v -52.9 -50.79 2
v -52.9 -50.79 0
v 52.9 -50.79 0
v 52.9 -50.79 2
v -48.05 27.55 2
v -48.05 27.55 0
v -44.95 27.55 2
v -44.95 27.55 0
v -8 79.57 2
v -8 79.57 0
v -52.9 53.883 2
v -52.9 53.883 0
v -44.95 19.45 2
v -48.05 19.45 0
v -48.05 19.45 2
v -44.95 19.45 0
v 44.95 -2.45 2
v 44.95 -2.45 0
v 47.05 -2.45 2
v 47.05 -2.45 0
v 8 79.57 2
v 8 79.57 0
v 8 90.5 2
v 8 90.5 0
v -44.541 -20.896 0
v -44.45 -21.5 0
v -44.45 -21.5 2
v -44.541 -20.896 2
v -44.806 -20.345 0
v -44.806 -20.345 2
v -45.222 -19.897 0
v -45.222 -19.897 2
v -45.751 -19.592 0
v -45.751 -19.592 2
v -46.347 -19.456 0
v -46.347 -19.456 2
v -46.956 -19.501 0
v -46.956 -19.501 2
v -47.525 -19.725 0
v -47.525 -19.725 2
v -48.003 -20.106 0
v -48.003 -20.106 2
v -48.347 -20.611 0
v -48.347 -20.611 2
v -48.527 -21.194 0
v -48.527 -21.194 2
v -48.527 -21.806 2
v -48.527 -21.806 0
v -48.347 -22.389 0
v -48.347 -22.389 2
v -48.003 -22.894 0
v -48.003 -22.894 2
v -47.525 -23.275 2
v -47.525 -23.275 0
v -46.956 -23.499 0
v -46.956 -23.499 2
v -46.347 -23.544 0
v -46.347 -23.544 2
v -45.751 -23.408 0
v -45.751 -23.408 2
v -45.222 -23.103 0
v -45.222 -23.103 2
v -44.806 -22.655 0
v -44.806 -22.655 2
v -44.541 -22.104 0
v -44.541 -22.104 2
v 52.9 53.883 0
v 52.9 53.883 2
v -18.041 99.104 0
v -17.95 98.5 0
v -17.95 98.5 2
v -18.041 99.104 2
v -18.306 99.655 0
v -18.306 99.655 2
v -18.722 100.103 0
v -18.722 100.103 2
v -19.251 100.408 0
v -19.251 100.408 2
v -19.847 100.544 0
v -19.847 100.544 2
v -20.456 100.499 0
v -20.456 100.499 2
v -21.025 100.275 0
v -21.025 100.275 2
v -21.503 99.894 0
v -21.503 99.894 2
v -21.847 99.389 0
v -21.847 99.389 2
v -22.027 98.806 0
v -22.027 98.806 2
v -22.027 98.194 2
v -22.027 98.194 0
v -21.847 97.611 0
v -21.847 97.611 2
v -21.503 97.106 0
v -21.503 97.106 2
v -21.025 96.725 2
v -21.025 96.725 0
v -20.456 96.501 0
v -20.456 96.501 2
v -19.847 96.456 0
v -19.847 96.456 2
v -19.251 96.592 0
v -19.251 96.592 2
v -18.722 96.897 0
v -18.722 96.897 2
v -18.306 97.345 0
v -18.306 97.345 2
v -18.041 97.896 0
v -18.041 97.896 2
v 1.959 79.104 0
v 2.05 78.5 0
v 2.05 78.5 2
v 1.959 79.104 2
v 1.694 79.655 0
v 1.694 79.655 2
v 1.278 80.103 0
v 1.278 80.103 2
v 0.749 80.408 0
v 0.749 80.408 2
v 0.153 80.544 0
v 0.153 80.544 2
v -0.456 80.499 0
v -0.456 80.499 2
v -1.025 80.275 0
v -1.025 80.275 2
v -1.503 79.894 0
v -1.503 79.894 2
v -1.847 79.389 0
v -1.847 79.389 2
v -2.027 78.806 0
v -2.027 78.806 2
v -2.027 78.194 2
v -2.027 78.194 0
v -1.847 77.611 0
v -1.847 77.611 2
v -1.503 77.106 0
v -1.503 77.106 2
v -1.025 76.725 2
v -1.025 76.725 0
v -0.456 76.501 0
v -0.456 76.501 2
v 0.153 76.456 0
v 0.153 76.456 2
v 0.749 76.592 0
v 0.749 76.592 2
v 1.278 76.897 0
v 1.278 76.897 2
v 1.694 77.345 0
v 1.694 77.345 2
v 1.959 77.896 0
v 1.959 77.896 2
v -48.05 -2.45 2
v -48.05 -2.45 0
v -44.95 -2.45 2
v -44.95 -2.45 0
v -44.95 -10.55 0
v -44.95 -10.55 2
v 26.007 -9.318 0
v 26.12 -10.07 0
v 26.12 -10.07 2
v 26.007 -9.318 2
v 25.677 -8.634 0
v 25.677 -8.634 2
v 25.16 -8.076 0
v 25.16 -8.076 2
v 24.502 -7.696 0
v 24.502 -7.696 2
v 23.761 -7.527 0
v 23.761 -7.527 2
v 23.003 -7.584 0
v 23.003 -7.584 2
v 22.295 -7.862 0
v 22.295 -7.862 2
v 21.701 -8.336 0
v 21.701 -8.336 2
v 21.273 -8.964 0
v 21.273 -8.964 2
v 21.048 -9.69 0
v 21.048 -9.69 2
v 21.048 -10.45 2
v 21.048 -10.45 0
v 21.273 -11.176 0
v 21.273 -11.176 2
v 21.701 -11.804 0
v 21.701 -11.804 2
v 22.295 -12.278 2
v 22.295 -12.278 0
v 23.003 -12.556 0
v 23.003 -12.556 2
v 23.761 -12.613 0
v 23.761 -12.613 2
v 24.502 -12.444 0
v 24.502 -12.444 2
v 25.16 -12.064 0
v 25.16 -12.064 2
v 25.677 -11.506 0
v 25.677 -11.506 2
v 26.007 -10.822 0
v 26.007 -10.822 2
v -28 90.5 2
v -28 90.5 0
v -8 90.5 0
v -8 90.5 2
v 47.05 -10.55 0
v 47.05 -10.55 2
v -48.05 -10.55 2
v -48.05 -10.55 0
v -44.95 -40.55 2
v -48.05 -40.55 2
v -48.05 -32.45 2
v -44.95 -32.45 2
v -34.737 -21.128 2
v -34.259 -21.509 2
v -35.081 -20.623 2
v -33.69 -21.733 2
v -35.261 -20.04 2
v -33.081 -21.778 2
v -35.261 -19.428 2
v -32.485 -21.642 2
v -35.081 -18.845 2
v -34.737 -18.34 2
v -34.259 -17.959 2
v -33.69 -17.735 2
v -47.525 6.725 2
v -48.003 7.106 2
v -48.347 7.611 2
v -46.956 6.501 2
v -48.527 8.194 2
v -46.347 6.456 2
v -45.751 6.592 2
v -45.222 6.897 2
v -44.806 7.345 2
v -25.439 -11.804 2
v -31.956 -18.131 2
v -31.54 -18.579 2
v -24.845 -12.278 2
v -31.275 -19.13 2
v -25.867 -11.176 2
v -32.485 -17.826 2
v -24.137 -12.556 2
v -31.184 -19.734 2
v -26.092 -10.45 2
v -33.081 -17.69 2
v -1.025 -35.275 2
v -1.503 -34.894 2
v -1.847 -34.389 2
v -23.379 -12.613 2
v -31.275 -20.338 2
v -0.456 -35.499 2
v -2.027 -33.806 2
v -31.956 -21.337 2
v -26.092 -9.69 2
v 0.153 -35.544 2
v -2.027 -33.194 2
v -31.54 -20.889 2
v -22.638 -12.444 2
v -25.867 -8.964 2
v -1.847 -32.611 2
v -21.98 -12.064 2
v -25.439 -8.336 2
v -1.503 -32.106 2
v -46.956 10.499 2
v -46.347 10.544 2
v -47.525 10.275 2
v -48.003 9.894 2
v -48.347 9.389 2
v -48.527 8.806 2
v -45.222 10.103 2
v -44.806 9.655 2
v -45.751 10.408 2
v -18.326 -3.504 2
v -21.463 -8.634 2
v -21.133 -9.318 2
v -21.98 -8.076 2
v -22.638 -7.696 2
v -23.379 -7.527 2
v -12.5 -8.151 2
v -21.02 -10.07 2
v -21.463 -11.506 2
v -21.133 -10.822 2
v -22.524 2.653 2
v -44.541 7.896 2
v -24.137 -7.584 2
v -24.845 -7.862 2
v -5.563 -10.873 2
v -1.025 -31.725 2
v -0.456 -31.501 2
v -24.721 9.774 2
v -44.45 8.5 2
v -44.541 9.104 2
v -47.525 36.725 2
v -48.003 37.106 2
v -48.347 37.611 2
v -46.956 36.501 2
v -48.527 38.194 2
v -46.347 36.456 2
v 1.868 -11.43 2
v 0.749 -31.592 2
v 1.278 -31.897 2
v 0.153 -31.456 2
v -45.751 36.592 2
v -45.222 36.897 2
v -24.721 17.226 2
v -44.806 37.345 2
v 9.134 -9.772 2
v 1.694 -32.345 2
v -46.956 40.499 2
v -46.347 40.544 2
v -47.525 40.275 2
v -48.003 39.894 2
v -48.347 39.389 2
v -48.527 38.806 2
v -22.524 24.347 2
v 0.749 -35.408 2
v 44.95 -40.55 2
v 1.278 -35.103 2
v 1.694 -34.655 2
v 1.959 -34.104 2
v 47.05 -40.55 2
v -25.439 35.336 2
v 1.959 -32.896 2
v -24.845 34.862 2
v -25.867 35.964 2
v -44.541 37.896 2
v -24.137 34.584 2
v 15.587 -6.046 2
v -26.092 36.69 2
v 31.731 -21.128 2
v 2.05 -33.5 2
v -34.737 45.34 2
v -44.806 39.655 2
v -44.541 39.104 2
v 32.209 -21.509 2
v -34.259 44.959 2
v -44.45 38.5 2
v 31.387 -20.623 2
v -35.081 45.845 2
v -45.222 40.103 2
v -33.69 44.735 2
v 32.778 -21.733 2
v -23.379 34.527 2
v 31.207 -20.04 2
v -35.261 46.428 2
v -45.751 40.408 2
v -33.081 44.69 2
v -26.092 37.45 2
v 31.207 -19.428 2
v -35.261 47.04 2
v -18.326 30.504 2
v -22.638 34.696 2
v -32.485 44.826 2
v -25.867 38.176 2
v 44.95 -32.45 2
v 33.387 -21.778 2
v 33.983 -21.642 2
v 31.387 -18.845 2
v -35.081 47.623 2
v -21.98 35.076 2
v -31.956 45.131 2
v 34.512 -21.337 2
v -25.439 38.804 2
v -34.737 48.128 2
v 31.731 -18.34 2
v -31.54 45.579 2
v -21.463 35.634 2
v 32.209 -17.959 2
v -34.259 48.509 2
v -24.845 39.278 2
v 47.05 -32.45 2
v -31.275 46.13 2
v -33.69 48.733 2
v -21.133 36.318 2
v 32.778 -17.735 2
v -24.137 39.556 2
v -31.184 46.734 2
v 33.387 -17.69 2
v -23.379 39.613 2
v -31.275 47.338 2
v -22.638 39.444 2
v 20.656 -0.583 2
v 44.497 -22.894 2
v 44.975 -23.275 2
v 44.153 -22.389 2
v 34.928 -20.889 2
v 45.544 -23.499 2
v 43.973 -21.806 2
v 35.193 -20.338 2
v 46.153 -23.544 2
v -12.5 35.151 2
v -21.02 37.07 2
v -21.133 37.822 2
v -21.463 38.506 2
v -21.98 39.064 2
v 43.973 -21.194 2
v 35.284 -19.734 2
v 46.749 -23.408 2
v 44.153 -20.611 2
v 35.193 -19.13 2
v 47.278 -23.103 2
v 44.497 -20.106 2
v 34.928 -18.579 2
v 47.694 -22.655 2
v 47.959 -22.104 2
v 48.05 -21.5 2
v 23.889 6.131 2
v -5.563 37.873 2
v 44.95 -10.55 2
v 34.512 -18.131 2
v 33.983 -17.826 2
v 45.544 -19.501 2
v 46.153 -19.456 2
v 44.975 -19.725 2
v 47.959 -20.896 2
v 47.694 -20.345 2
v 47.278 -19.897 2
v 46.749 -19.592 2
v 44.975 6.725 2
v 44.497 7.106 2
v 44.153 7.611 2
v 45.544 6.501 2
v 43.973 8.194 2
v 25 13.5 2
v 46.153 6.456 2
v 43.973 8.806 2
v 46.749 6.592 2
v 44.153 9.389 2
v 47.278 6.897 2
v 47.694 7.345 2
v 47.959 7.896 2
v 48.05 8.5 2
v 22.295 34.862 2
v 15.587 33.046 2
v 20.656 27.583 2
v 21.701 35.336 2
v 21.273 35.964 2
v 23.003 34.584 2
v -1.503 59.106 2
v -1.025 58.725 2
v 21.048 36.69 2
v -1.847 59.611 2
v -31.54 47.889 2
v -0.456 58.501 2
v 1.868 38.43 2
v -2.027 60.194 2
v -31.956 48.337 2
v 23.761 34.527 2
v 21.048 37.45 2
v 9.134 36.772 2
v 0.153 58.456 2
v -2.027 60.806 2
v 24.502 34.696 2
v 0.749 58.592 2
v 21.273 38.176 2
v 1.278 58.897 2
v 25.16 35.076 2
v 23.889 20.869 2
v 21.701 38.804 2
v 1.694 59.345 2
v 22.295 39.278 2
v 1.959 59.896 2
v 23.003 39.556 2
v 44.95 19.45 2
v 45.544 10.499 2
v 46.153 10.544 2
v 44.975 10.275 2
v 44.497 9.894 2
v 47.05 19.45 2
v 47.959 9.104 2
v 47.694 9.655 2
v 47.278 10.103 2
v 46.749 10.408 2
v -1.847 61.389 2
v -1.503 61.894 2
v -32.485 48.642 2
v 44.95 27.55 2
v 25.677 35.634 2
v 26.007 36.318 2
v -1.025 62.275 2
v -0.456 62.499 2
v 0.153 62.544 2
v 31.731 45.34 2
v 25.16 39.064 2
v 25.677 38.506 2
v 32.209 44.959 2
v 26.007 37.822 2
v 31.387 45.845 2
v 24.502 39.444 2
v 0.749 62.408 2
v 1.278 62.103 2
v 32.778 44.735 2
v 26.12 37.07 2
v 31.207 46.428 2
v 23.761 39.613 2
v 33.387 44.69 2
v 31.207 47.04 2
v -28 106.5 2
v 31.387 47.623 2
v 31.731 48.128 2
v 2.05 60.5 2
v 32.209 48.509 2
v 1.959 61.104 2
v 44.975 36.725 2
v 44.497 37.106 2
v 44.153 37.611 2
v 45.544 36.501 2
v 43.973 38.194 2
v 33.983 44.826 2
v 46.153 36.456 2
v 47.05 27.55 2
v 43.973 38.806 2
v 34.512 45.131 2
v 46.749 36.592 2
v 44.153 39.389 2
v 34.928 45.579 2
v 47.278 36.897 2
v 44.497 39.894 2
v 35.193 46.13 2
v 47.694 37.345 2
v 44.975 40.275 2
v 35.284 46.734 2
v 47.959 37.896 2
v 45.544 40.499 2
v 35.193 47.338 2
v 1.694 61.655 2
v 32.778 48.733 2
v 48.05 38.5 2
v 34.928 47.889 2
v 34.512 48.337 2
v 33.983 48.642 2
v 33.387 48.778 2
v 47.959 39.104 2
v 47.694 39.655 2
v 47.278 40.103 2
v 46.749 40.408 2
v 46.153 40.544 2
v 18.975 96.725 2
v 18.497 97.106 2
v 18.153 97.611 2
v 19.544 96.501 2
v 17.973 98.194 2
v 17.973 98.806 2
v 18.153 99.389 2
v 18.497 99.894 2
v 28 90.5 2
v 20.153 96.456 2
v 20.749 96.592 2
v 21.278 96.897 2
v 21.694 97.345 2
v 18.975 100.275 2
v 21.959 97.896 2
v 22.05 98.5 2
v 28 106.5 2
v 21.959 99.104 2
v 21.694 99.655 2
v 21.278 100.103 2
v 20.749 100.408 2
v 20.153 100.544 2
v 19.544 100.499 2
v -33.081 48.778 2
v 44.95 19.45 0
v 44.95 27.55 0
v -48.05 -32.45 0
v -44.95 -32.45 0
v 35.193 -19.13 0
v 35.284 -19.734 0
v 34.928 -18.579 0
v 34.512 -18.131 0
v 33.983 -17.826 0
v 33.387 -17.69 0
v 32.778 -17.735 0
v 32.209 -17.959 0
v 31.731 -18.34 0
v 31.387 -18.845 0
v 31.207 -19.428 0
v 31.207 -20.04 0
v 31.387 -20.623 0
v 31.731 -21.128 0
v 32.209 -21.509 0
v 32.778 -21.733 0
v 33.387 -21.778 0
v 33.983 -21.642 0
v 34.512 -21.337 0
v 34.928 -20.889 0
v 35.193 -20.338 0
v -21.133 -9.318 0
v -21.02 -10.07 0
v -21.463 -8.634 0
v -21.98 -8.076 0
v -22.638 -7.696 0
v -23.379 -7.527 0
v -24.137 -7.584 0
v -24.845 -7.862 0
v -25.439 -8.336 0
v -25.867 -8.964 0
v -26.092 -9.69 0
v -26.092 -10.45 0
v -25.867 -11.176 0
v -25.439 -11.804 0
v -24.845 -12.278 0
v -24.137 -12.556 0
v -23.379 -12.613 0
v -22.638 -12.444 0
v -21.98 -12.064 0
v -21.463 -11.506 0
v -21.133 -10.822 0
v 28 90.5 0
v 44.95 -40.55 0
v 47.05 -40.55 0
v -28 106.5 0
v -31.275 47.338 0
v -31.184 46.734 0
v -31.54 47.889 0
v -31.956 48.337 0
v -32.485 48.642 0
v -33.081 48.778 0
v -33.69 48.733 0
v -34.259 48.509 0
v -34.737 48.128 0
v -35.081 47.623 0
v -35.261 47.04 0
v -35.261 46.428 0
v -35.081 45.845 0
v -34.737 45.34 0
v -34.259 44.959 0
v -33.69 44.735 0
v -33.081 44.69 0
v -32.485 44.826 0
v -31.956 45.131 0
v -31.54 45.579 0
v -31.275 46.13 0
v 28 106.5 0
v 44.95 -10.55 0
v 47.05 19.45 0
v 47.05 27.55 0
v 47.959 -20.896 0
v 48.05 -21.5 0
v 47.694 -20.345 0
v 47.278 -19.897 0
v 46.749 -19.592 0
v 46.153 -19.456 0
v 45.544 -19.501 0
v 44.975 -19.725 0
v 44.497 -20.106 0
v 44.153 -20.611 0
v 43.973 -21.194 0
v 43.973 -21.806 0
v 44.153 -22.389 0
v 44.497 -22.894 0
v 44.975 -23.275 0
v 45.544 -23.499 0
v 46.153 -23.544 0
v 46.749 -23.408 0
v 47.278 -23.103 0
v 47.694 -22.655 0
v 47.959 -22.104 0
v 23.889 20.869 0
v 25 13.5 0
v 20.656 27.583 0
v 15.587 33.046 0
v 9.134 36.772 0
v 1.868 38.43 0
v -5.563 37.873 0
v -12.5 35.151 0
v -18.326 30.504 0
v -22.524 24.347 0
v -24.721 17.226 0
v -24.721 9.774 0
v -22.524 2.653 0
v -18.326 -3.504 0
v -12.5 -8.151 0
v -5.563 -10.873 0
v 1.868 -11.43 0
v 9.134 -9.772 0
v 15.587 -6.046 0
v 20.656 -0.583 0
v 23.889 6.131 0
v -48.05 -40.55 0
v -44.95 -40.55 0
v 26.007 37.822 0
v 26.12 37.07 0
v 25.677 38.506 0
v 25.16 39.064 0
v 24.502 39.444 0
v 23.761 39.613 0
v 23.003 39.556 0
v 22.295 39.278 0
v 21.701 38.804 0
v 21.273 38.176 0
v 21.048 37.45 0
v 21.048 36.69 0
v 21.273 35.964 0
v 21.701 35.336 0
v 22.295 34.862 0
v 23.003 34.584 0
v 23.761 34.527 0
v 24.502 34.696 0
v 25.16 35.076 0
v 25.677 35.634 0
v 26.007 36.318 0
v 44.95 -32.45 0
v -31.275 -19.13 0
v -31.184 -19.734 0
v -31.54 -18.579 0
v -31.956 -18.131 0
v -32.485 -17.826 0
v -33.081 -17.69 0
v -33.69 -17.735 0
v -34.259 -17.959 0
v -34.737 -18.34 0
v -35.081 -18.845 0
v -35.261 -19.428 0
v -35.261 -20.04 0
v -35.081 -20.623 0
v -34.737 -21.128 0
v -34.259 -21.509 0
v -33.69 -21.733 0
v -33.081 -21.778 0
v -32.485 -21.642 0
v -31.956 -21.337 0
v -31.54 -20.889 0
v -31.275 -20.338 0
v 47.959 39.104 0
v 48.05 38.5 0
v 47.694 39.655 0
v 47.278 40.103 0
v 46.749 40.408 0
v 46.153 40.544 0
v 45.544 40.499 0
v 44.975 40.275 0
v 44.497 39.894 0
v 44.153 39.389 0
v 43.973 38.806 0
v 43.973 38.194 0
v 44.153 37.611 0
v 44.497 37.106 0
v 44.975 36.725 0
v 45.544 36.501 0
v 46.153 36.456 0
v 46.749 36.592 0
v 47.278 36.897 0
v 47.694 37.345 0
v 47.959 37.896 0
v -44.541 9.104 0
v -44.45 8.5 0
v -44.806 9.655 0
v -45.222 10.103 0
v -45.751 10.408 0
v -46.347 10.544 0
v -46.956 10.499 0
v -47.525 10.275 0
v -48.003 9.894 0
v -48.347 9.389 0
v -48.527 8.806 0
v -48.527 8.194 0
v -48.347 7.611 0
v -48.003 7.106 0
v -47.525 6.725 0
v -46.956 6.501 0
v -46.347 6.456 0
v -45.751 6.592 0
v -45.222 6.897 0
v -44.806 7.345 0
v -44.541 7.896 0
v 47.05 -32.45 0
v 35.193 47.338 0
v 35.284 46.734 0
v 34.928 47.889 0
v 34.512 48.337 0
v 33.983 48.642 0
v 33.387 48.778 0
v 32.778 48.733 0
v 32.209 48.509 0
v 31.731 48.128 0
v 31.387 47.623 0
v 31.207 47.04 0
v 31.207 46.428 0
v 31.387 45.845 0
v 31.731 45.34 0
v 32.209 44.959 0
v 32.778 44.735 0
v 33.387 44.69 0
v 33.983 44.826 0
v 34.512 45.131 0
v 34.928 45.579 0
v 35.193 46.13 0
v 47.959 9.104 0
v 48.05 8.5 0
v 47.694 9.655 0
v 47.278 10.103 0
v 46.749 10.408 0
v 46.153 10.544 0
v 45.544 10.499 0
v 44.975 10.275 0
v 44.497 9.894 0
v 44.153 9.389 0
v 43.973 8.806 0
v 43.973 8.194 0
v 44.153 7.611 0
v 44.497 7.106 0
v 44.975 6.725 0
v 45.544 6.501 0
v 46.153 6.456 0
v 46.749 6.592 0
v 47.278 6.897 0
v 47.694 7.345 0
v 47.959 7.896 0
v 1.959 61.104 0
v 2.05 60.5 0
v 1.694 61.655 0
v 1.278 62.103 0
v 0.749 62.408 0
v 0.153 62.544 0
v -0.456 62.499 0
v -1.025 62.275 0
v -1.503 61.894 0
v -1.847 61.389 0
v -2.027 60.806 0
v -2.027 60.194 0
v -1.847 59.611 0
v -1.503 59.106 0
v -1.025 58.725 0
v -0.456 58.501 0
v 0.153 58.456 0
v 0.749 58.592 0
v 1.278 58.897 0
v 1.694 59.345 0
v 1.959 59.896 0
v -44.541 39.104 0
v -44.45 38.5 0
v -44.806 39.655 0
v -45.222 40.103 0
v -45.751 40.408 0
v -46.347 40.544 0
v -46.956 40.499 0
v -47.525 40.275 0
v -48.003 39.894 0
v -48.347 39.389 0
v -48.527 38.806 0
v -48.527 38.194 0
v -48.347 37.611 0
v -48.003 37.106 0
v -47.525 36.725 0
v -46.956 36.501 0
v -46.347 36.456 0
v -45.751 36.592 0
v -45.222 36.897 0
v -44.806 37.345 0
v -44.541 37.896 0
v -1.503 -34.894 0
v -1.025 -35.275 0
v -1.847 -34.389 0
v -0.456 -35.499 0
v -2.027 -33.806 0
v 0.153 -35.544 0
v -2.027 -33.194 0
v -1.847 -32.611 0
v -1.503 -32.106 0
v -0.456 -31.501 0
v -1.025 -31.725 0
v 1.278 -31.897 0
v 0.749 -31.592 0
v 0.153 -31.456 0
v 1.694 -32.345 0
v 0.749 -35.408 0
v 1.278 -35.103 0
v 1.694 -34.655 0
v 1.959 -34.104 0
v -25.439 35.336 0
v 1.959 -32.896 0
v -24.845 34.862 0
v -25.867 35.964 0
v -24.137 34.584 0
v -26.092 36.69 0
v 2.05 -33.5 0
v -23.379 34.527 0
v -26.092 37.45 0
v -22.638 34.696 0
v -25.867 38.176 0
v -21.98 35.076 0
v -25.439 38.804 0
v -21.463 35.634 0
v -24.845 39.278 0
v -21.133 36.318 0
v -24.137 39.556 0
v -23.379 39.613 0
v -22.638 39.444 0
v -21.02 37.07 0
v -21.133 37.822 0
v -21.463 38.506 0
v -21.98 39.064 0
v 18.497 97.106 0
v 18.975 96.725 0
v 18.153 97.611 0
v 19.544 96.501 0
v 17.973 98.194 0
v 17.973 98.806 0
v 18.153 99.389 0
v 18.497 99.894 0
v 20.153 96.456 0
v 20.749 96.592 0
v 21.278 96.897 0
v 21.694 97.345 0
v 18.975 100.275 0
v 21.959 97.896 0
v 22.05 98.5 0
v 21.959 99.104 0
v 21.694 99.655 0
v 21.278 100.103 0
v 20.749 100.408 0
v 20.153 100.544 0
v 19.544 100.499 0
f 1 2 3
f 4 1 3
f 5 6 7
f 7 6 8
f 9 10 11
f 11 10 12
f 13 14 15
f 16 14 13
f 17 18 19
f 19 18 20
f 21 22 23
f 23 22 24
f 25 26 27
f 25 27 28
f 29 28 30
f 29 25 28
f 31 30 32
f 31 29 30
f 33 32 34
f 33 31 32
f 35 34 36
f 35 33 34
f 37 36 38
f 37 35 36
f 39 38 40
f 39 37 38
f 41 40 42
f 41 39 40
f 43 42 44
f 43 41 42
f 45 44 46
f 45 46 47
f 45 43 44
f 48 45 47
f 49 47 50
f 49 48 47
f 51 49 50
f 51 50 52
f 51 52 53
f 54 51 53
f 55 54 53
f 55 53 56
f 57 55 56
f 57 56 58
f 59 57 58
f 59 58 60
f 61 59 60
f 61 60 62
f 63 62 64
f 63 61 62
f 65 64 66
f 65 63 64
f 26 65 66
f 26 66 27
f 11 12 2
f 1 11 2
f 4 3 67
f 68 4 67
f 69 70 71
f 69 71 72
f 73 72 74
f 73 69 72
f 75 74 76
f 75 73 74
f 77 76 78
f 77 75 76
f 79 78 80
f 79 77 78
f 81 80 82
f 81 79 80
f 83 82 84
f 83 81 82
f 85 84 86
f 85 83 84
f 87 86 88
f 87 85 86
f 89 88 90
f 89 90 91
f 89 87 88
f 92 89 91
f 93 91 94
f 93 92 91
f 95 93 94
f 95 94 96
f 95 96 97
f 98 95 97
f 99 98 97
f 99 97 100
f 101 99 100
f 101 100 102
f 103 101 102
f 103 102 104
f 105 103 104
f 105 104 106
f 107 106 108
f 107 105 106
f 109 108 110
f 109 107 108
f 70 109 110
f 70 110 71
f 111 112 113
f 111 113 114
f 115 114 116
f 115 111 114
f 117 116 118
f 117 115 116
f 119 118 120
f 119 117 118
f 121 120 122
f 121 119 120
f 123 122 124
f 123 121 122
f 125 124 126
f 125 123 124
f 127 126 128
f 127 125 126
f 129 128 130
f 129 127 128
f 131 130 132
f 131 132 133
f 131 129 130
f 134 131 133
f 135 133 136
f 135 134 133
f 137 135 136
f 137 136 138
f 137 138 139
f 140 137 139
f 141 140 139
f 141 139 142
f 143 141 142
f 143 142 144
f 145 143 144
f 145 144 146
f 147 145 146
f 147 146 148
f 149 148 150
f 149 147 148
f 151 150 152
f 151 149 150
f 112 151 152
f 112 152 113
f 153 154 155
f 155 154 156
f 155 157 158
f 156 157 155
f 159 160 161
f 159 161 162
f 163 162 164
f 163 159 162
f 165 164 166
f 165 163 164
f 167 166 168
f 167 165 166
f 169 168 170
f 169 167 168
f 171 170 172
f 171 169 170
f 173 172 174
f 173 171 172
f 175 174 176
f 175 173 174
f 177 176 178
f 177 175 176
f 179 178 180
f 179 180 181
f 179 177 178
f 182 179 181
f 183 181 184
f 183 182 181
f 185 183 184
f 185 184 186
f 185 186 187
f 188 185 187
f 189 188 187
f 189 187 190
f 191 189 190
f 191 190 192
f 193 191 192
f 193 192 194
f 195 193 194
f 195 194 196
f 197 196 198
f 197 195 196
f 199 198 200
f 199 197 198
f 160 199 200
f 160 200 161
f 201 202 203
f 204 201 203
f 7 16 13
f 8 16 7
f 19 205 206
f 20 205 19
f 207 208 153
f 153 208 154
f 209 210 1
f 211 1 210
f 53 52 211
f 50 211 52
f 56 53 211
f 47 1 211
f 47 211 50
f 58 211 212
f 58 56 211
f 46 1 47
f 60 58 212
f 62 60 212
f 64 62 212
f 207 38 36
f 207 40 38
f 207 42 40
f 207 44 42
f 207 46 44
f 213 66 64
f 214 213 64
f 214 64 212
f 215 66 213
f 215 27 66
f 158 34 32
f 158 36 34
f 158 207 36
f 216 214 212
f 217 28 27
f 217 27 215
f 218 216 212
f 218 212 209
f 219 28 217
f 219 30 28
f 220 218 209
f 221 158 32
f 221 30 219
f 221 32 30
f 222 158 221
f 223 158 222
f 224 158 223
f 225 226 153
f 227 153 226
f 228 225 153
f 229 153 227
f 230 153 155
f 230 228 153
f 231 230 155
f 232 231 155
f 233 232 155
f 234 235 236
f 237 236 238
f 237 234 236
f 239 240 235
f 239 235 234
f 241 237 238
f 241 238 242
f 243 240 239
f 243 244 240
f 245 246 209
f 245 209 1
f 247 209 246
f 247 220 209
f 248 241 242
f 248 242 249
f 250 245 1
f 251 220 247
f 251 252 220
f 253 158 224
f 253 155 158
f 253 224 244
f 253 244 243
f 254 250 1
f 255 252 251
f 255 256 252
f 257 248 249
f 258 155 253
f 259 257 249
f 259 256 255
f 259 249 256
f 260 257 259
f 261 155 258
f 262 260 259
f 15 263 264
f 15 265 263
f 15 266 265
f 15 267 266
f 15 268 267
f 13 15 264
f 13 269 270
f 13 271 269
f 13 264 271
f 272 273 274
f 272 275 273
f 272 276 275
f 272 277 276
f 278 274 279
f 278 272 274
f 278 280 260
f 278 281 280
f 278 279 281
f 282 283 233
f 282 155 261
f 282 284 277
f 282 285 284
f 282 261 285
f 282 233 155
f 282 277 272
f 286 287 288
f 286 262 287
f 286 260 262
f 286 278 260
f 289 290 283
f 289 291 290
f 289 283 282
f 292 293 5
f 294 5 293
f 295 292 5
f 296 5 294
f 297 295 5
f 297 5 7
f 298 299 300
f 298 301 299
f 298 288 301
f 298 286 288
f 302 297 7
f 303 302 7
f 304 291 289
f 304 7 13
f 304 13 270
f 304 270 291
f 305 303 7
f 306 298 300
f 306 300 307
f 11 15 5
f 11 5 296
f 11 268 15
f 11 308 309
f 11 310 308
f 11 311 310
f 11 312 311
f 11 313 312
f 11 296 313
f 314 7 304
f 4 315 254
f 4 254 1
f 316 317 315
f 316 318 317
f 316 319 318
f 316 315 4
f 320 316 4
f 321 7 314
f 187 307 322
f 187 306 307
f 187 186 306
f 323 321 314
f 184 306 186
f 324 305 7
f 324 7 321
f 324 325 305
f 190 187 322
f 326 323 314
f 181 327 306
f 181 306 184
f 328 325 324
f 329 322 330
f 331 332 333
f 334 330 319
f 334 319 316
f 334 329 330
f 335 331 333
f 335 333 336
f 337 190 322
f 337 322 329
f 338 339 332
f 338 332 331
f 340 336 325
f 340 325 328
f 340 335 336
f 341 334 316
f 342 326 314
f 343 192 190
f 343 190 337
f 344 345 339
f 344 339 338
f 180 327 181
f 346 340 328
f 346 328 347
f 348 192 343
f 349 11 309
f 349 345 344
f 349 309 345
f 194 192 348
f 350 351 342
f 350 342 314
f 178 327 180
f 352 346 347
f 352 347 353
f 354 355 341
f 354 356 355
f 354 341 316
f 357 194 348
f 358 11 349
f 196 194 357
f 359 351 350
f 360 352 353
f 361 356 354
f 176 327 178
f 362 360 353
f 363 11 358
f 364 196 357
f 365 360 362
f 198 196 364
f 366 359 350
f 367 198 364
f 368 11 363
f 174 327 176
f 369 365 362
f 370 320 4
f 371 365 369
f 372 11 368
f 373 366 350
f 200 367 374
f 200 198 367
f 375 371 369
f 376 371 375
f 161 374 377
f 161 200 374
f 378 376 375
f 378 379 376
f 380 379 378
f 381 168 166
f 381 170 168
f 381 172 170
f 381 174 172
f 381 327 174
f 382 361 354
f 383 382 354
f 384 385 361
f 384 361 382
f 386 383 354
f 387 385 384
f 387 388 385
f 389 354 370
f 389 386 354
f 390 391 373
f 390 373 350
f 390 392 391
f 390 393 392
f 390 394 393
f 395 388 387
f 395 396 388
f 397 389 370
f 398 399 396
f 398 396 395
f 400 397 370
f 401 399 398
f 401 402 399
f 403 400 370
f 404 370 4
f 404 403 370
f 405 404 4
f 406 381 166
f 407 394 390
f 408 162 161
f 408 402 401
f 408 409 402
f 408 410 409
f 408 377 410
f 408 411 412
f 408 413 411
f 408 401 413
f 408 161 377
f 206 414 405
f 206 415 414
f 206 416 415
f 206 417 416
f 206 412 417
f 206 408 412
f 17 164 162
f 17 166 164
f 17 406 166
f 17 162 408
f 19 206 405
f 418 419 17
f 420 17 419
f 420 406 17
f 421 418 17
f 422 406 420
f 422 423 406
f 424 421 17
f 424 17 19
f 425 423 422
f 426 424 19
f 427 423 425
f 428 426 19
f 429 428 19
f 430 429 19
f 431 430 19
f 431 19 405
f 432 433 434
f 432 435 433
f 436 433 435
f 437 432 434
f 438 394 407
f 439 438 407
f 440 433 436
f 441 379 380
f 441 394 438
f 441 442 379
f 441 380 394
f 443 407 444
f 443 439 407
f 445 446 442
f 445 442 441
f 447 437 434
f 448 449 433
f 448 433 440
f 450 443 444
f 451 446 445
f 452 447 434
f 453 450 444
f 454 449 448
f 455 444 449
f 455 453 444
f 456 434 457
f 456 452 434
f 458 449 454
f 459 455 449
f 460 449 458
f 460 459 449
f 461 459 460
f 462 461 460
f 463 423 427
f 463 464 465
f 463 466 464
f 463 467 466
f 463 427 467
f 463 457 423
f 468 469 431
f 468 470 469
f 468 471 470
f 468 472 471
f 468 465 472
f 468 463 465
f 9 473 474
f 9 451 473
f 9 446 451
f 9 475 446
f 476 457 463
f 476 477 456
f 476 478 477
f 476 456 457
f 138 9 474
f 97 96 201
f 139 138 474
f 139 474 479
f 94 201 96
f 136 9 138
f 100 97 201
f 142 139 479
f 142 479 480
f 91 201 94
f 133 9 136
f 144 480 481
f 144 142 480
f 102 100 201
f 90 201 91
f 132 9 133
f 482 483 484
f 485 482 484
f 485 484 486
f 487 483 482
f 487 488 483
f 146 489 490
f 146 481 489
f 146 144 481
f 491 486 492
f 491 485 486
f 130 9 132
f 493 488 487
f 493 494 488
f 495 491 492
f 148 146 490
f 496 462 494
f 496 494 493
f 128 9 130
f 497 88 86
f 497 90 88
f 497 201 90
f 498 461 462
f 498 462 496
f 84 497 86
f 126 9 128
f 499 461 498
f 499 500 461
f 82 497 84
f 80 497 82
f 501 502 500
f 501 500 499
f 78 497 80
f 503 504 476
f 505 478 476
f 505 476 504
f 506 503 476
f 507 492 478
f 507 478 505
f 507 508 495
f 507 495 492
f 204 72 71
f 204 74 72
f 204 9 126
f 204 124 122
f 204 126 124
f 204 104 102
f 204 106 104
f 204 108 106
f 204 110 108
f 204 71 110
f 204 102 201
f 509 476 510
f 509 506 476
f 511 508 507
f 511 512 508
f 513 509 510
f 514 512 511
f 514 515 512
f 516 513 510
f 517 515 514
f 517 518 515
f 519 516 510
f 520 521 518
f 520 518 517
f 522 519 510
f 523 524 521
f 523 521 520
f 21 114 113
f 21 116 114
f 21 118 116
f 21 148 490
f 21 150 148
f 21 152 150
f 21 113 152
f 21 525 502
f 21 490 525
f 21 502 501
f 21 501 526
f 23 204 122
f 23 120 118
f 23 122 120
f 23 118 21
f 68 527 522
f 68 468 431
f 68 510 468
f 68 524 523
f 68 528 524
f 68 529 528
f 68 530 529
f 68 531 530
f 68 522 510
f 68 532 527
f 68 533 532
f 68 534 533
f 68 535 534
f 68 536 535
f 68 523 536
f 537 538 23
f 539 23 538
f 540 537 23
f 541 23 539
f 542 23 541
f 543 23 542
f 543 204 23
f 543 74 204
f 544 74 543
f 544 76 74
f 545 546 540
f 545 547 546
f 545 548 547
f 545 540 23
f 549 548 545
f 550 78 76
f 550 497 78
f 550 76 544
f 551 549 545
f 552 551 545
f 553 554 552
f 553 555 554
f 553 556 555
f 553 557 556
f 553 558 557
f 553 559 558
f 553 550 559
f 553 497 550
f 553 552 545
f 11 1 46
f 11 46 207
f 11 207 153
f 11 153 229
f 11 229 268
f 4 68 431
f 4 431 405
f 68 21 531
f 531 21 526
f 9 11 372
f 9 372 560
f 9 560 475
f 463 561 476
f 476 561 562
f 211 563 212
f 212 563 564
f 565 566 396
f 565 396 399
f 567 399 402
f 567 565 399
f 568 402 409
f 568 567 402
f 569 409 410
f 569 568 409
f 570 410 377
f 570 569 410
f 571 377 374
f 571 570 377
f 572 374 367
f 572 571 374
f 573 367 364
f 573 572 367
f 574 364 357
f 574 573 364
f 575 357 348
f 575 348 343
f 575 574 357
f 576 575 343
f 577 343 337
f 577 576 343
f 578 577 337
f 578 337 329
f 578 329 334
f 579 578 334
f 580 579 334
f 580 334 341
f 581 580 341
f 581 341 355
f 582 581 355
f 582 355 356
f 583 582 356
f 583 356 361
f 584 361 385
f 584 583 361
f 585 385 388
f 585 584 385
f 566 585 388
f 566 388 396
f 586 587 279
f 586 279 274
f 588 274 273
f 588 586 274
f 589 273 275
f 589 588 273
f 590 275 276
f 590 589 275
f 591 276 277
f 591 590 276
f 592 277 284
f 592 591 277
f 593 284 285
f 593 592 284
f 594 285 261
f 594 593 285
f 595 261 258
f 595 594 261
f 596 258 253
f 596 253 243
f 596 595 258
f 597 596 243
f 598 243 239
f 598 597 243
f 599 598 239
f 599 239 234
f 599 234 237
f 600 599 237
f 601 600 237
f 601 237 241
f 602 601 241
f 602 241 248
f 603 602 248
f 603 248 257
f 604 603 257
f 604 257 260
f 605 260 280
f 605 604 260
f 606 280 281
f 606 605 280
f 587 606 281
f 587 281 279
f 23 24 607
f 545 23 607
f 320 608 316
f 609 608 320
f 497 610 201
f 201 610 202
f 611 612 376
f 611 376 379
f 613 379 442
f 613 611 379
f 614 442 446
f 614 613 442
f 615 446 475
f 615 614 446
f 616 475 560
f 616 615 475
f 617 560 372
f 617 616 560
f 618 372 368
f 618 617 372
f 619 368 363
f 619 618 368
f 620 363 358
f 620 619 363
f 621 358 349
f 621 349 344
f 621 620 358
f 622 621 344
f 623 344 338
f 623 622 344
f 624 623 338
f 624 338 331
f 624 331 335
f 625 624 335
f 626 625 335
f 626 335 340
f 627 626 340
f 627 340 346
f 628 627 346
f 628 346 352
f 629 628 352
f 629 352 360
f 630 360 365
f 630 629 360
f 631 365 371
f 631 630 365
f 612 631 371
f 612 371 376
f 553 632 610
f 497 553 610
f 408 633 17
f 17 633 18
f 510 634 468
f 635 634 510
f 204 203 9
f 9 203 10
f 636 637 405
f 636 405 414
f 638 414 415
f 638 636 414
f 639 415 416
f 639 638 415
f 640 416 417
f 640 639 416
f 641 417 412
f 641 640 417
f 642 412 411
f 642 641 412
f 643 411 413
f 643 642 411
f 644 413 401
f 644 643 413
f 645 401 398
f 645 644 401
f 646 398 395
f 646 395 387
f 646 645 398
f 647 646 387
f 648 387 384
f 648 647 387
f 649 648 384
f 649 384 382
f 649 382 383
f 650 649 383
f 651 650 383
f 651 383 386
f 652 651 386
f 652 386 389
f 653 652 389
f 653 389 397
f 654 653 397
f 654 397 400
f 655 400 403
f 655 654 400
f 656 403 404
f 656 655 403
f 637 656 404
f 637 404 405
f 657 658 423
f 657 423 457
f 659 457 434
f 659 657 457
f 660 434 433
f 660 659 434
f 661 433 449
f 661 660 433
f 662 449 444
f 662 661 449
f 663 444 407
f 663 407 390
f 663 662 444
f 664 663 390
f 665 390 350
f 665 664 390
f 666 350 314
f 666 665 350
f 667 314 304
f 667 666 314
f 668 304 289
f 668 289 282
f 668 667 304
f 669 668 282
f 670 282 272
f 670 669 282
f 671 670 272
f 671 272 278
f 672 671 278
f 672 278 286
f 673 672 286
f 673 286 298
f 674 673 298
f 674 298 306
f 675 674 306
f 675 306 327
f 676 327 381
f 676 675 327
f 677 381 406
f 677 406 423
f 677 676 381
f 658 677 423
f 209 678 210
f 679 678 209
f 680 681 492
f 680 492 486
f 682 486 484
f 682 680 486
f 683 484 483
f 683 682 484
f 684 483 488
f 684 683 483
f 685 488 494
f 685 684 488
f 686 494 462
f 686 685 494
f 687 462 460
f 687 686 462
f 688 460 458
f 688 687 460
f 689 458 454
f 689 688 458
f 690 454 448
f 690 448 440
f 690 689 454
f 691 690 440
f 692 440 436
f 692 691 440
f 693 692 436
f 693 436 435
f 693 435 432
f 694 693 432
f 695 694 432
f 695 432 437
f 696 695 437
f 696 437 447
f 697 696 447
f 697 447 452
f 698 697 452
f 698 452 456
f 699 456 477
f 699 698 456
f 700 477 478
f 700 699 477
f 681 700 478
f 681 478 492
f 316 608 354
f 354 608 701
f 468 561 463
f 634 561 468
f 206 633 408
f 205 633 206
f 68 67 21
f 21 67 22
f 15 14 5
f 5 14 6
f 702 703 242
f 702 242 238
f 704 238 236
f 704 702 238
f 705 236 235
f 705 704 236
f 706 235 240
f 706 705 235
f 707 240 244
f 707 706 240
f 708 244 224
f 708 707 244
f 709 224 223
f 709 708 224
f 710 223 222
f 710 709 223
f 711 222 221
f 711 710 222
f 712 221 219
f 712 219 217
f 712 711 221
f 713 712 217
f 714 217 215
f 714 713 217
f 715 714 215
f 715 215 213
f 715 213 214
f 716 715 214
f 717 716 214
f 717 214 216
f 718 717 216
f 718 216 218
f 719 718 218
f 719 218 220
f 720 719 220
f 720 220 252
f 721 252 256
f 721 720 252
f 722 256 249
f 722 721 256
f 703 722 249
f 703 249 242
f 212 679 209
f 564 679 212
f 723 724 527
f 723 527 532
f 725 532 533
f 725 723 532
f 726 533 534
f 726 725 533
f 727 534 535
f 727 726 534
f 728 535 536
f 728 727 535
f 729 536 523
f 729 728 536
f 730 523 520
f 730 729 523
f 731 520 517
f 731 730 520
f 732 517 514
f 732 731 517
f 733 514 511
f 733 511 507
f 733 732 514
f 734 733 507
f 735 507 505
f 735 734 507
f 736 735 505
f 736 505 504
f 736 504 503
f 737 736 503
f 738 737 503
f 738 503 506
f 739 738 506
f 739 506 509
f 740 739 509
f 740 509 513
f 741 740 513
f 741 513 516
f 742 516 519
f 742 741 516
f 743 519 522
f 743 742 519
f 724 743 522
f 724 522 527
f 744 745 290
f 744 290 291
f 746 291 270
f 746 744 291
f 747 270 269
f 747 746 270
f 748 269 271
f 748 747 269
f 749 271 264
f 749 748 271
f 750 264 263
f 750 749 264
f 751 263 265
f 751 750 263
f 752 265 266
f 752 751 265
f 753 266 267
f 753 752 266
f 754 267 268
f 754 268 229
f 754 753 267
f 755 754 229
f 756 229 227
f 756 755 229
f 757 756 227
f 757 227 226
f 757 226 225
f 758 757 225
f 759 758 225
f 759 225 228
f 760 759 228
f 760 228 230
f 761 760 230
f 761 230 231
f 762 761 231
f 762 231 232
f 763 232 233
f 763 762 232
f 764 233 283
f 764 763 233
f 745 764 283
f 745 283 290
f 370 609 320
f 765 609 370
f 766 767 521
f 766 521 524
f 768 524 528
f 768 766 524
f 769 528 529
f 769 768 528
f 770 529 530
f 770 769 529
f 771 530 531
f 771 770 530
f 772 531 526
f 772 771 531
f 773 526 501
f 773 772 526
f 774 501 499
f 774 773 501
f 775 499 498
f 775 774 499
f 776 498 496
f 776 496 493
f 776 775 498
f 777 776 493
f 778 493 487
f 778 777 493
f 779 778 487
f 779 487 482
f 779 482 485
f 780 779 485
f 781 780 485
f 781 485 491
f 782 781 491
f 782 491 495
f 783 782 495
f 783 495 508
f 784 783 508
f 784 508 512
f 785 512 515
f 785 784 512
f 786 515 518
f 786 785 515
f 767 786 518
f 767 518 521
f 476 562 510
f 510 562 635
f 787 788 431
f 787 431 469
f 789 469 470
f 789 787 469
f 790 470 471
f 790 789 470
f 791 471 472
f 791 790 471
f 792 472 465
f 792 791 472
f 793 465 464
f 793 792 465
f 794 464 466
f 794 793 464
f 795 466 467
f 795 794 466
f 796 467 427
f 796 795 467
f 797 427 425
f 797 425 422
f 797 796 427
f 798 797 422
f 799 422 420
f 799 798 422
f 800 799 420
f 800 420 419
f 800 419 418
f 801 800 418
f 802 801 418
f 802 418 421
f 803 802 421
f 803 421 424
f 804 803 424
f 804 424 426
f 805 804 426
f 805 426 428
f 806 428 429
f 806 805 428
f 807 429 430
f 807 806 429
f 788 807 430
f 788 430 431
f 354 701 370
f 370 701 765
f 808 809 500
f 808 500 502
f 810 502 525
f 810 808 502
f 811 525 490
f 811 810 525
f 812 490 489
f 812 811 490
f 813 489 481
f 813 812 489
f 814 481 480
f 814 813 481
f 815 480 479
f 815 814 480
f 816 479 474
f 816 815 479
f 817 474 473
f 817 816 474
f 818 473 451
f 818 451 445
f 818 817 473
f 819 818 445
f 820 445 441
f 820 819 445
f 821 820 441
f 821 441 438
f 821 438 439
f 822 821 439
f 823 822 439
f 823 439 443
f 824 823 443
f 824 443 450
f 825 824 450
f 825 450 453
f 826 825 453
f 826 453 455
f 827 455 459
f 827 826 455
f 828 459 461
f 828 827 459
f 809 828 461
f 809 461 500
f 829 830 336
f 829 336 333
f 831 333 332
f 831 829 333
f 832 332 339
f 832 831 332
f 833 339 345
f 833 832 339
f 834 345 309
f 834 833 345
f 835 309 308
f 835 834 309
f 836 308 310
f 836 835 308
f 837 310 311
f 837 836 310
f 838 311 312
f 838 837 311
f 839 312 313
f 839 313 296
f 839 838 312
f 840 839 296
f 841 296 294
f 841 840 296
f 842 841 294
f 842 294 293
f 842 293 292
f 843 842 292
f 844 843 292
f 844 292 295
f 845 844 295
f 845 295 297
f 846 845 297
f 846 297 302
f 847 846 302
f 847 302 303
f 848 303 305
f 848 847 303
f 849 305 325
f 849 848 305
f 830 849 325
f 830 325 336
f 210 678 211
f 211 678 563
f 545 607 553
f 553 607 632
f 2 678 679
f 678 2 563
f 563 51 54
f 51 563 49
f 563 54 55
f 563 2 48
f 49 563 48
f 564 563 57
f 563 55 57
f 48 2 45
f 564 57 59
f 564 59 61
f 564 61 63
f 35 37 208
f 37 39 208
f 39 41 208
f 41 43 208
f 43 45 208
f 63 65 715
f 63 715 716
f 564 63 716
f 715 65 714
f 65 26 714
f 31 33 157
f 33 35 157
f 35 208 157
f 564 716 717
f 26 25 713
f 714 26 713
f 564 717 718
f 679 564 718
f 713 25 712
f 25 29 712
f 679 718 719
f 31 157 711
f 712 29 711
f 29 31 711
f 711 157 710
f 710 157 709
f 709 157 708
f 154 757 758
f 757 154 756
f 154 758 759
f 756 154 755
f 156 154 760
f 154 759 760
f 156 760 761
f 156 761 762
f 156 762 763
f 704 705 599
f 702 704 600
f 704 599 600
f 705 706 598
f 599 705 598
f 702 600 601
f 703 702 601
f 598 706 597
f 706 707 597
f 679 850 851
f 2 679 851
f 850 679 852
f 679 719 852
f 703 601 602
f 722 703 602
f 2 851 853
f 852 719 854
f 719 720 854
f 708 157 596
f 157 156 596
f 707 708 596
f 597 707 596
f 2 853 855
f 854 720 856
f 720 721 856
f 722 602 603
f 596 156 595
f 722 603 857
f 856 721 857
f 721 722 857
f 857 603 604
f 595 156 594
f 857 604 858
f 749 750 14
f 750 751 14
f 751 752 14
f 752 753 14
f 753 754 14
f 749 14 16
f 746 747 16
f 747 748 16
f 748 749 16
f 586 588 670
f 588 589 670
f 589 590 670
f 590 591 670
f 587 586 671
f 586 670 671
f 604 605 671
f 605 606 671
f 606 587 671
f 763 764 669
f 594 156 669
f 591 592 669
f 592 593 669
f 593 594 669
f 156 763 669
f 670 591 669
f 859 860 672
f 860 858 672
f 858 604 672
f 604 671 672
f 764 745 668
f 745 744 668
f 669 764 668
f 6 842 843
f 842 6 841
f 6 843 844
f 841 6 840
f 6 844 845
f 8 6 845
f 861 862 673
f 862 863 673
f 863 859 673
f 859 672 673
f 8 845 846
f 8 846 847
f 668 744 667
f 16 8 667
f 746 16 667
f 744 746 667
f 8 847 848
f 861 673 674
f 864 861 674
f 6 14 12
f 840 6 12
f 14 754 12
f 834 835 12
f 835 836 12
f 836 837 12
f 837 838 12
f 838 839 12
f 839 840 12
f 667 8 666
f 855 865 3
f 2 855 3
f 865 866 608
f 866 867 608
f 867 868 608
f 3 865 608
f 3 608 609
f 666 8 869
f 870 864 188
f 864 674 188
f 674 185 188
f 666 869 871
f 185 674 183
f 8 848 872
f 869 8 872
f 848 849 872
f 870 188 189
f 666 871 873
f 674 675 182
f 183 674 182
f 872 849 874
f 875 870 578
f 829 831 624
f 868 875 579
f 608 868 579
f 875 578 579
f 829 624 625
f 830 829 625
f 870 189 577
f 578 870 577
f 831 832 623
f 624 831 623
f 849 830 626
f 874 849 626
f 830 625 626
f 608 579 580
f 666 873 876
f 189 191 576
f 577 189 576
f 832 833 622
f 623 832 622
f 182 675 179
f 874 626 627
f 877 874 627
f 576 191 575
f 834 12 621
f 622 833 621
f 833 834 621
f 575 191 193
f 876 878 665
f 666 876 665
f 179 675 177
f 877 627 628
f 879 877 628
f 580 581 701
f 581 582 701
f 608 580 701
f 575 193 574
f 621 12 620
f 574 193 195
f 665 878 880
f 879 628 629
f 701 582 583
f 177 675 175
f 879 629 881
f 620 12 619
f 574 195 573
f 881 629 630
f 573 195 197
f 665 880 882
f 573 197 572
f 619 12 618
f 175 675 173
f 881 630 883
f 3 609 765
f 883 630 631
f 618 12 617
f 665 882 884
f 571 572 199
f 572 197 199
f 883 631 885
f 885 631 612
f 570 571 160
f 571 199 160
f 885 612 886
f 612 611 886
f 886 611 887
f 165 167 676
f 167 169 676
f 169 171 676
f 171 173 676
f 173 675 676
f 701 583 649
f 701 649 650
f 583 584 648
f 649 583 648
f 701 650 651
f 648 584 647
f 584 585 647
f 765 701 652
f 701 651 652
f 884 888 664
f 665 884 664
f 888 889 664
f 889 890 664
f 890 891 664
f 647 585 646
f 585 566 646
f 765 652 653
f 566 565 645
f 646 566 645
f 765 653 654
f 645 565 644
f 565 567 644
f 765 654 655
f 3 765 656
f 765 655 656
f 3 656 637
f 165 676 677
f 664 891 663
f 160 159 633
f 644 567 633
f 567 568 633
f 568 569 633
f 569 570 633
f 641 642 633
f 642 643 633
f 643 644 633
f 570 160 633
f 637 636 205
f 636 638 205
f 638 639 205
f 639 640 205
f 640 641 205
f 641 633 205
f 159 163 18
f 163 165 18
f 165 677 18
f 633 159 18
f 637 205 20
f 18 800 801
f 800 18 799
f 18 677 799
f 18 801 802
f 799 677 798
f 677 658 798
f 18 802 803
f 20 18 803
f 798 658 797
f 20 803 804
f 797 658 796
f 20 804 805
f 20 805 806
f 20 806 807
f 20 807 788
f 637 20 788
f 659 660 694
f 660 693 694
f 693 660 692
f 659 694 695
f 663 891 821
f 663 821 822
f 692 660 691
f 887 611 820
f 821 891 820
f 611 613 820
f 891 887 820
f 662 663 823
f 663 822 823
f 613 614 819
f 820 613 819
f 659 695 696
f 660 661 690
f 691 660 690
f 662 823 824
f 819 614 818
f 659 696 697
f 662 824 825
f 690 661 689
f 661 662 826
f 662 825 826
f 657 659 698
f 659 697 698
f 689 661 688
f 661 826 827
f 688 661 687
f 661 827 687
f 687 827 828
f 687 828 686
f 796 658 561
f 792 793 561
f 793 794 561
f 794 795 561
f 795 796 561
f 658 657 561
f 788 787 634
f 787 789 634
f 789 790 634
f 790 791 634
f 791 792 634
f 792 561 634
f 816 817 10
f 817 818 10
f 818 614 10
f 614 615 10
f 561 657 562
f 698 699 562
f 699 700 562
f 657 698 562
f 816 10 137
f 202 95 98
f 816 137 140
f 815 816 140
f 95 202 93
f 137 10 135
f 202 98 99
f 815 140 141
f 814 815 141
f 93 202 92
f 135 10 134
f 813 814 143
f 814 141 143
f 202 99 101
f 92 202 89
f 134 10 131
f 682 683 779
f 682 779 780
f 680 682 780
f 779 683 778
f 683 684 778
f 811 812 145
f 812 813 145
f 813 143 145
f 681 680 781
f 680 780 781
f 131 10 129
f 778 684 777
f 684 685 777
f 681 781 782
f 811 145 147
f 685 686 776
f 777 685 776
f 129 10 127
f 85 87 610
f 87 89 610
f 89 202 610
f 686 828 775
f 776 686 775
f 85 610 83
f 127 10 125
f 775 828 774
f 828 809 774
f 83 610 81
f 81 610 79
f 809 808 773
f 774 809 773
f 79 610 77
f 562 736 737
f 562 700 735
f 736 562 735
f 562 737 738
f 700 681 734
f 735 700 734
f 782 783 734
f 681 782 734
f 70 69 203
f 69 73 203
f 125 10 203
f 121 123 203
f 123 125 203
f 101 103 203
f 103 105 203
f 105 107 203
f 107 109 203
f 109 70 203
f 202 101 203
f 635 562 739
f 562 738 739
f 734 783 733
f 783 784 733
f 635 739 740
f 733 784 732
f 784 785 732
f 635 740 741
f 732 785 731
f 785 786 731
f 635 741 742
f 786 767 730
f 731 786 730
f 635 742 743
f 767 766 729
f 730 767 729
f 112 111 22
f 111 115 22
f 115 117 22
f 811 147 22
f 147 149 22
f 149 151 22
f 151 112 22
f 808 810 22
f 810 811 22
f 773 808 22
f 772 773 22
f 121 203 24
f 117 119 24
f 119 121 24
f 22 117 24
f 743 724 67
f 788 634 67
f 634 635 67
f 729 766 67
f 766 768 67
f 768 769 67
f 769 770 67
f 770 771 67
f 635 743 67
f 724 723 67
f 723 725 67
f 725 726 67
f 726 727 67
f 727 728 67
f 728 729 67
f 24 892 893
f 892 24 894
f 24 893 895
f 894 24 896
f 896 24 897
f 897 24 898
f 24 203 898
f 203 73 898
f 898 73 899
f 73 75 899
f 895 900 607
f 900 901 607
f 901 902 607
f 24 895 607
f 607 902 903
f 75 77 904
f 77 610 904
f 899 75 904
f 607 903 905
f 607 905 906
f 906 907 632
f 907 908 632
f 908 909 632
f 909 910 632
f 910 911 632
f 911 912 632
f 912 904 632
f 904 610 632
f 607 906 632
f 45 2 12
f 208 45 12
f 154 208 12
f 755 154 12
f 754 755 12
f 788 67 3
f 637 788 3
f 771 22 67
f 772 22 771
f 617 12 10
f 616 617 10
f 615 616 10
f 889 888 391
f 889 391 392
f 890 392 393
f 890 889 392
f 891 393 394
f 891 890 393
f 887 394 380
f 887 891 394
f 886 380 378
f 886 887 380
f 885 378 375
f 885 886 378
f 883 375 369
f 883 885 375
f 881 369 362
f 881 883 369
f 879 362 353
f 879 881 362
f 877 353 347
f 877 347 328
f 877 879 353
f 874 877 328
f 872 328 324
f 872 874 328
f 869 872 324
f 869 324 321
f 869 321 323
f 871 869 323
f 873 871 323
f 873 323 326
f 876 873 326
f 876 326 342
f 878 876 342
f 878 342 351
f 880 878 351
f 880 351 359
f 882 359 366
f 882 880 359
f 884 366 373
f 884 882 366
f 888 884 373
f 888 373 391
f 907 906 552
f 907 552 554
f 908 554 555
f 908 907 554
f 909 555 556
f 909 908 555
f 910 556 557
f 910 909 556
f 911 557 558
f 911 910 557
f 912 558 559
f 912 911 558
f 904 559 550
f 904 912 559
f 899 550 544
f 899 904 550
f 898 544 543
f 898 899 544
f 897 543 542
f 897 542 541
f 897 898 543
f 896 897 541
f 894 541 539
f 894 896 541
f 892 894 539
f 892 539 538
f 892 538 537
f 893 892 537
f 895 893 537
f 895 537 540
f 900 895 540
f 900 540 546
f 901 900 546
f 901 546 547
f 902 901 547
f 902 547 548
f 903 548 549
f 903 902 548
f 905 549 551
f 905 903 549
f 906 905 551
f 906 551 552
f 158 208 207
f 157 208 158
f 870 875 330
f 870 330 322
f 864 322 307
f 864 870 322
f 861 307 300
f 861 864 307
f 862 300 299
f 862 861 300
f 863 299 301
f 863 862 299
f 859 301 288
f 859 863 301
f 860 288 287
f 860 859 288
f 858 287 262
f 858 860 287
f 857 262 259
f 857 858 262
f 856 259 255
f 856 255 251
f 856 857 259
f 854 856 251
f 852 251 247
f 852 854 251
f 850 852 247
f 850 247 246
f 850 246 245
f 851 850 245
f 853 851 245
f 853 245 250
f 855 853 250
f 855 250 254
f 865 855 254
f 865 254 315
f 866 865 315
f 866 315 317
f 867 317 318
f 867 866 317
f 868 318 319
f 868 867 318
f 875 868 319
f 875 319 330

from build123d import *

# Parameters (mm, degrees)
SKETCH_1_R      = 2.55
SKETCH_1_R_2    = 25
SKETCH_1_R_3    = 2.05
SKETCH_1_W      = 2.1
SKETCH_1_H      = 8.1
SKETCH_1_W_2    = 3.1
EXTRUDE_1_DEPTH = 2


with BuildPart() as part:
    # 草图1 → 凸台-拉伸1 (new body)
    with BuildSketch(Plane.XY):
        Polygon((-52.9, 53.883164809), (-52.9, -50.790000001), (52.9, -50.790000001), (52.9, 53.883164809), (8, 79.569735886), (8, 90.5), (28, 90.5), (28, 106.5), (-28, 106.5), (-28, 90.5), (-8, 90.5), (-8, 79.569735886), align=None)
        with Locations((-23.57, 37.07)):
            Circle(SKETCH_1_R, mode=Mode.SUBTRACT)
        with Locations((-23.57, -10.07)):
            Circle(SKETCH_1_R, mode=Mode.SUBTRACT)
        with Locations((23.57, -10.07)):
            Circle(SKETCH_1_R, mode=Mode.SUBTRACT)
        with Locations((23.57, 37.07)):
            Circle(SKETCH_1_R, mode=Mode.SUBTRACT)
        with Locations((0, 13.5)):
            Circle(SKETCH_1_R_2, mode=Mode.SUBTRACT)
        with Locations((0, 60.5)):
            Circle(SKETCH_1_R_3, mode=Mode.SUBTRACT)
        with Locations((33.234018716, 46.734018716)):
            Circle(SKETCH_1_R_3, mode=Mode.SUBTRACT)
        with Locations((33.234018716, -19.734018716)):
            Circle(SKETCH_1_R_3, mode=Mode.SUBTRACT)
        with Locations((0, -33.5)):
            Circle(SKETCH_1_R_3, mode=Mode.SUBTRACT)
        with Locations((-33.234018716, -19.734018716)):
            Circle(SKETCH_1_R_3, mode=Mode.SUBTRACT)
        with Locations((-33.234018716, 46.734018716)):
            Circle(SKETCH_1_R_3, mode=Mode.SUBTRACT)
        with Locations((0, 78.5)):
            Circle(SKETCH_1_R_3, mode=Mode.SUBTRACT)
        with Locations((-20, 98.5)):
            Circle(SKETCH_1_R_3, mode=Mode.SUBTRACT)
        with Locations((20, 98.5)):
            Circle(SKETCH_1_R_3, mode=Mode.SUBTRACT)
        with Locations((46, 8.5)):
            Circle(SKETCH_1_R_3, mode=Mode.SUBTRACT)
        with Locations((46, -21.5)):
            Circle(SKETCH_1_R_3, mode=Mode.SUBTRACT)
        with Locations((46, 38.5)):
            Circle(SKETCH_1_R_3, mode=Mode.SUBTRACT)
        with Locations((-46.5, -21.5)):
            Circle(SKETCH_1_R_3, mode=Mode.SUBTRACT)
        with Locations((-46.5, 8.5)):
            Circle(SKETCH_1_R_3, mode=Mode.SUBTRACT)
        with Locations((-46.5, 38.5)):
            Circle(SKETCH_1_R_3, mode=Mode.SUBTRACT)
        with Locations((46, 23.5)):
            Rectangle(SKETCH_1_W, SKETCH_1_H, mode=Mode.SUBTRACT)
        with Locations((46, -6.5)):
            Rectangle(SKETCH_1_W, SKETCH_1_H, mode=Mode.SUBTRACT)
        with Locations((46, -36.5)):
            Rectangle(SKETCH_1_W, SKETCH_1_H, mode=Mode.SUBTRACT)
        with Locations((-46.5, 23.5)):
            Rectangle(SKETCH_1_W_2, SKETCH_1_H, mode=Mode.SUBTRACT)
        with Locations((-46.5, -6.5)):
            Rectangle(SKETCH_1_W_2, SKETCH_1_H, mode=Mode.SUBTRACT)
        with Locations((-46.5, -36.5)):
            Rectangle(SKETCH_1_W_2, SKETCH_1_H, mode=Mode.SUBTRACT)
    extrude(amount=EXTRUDE_1_DEPTH)


solid = part.part
